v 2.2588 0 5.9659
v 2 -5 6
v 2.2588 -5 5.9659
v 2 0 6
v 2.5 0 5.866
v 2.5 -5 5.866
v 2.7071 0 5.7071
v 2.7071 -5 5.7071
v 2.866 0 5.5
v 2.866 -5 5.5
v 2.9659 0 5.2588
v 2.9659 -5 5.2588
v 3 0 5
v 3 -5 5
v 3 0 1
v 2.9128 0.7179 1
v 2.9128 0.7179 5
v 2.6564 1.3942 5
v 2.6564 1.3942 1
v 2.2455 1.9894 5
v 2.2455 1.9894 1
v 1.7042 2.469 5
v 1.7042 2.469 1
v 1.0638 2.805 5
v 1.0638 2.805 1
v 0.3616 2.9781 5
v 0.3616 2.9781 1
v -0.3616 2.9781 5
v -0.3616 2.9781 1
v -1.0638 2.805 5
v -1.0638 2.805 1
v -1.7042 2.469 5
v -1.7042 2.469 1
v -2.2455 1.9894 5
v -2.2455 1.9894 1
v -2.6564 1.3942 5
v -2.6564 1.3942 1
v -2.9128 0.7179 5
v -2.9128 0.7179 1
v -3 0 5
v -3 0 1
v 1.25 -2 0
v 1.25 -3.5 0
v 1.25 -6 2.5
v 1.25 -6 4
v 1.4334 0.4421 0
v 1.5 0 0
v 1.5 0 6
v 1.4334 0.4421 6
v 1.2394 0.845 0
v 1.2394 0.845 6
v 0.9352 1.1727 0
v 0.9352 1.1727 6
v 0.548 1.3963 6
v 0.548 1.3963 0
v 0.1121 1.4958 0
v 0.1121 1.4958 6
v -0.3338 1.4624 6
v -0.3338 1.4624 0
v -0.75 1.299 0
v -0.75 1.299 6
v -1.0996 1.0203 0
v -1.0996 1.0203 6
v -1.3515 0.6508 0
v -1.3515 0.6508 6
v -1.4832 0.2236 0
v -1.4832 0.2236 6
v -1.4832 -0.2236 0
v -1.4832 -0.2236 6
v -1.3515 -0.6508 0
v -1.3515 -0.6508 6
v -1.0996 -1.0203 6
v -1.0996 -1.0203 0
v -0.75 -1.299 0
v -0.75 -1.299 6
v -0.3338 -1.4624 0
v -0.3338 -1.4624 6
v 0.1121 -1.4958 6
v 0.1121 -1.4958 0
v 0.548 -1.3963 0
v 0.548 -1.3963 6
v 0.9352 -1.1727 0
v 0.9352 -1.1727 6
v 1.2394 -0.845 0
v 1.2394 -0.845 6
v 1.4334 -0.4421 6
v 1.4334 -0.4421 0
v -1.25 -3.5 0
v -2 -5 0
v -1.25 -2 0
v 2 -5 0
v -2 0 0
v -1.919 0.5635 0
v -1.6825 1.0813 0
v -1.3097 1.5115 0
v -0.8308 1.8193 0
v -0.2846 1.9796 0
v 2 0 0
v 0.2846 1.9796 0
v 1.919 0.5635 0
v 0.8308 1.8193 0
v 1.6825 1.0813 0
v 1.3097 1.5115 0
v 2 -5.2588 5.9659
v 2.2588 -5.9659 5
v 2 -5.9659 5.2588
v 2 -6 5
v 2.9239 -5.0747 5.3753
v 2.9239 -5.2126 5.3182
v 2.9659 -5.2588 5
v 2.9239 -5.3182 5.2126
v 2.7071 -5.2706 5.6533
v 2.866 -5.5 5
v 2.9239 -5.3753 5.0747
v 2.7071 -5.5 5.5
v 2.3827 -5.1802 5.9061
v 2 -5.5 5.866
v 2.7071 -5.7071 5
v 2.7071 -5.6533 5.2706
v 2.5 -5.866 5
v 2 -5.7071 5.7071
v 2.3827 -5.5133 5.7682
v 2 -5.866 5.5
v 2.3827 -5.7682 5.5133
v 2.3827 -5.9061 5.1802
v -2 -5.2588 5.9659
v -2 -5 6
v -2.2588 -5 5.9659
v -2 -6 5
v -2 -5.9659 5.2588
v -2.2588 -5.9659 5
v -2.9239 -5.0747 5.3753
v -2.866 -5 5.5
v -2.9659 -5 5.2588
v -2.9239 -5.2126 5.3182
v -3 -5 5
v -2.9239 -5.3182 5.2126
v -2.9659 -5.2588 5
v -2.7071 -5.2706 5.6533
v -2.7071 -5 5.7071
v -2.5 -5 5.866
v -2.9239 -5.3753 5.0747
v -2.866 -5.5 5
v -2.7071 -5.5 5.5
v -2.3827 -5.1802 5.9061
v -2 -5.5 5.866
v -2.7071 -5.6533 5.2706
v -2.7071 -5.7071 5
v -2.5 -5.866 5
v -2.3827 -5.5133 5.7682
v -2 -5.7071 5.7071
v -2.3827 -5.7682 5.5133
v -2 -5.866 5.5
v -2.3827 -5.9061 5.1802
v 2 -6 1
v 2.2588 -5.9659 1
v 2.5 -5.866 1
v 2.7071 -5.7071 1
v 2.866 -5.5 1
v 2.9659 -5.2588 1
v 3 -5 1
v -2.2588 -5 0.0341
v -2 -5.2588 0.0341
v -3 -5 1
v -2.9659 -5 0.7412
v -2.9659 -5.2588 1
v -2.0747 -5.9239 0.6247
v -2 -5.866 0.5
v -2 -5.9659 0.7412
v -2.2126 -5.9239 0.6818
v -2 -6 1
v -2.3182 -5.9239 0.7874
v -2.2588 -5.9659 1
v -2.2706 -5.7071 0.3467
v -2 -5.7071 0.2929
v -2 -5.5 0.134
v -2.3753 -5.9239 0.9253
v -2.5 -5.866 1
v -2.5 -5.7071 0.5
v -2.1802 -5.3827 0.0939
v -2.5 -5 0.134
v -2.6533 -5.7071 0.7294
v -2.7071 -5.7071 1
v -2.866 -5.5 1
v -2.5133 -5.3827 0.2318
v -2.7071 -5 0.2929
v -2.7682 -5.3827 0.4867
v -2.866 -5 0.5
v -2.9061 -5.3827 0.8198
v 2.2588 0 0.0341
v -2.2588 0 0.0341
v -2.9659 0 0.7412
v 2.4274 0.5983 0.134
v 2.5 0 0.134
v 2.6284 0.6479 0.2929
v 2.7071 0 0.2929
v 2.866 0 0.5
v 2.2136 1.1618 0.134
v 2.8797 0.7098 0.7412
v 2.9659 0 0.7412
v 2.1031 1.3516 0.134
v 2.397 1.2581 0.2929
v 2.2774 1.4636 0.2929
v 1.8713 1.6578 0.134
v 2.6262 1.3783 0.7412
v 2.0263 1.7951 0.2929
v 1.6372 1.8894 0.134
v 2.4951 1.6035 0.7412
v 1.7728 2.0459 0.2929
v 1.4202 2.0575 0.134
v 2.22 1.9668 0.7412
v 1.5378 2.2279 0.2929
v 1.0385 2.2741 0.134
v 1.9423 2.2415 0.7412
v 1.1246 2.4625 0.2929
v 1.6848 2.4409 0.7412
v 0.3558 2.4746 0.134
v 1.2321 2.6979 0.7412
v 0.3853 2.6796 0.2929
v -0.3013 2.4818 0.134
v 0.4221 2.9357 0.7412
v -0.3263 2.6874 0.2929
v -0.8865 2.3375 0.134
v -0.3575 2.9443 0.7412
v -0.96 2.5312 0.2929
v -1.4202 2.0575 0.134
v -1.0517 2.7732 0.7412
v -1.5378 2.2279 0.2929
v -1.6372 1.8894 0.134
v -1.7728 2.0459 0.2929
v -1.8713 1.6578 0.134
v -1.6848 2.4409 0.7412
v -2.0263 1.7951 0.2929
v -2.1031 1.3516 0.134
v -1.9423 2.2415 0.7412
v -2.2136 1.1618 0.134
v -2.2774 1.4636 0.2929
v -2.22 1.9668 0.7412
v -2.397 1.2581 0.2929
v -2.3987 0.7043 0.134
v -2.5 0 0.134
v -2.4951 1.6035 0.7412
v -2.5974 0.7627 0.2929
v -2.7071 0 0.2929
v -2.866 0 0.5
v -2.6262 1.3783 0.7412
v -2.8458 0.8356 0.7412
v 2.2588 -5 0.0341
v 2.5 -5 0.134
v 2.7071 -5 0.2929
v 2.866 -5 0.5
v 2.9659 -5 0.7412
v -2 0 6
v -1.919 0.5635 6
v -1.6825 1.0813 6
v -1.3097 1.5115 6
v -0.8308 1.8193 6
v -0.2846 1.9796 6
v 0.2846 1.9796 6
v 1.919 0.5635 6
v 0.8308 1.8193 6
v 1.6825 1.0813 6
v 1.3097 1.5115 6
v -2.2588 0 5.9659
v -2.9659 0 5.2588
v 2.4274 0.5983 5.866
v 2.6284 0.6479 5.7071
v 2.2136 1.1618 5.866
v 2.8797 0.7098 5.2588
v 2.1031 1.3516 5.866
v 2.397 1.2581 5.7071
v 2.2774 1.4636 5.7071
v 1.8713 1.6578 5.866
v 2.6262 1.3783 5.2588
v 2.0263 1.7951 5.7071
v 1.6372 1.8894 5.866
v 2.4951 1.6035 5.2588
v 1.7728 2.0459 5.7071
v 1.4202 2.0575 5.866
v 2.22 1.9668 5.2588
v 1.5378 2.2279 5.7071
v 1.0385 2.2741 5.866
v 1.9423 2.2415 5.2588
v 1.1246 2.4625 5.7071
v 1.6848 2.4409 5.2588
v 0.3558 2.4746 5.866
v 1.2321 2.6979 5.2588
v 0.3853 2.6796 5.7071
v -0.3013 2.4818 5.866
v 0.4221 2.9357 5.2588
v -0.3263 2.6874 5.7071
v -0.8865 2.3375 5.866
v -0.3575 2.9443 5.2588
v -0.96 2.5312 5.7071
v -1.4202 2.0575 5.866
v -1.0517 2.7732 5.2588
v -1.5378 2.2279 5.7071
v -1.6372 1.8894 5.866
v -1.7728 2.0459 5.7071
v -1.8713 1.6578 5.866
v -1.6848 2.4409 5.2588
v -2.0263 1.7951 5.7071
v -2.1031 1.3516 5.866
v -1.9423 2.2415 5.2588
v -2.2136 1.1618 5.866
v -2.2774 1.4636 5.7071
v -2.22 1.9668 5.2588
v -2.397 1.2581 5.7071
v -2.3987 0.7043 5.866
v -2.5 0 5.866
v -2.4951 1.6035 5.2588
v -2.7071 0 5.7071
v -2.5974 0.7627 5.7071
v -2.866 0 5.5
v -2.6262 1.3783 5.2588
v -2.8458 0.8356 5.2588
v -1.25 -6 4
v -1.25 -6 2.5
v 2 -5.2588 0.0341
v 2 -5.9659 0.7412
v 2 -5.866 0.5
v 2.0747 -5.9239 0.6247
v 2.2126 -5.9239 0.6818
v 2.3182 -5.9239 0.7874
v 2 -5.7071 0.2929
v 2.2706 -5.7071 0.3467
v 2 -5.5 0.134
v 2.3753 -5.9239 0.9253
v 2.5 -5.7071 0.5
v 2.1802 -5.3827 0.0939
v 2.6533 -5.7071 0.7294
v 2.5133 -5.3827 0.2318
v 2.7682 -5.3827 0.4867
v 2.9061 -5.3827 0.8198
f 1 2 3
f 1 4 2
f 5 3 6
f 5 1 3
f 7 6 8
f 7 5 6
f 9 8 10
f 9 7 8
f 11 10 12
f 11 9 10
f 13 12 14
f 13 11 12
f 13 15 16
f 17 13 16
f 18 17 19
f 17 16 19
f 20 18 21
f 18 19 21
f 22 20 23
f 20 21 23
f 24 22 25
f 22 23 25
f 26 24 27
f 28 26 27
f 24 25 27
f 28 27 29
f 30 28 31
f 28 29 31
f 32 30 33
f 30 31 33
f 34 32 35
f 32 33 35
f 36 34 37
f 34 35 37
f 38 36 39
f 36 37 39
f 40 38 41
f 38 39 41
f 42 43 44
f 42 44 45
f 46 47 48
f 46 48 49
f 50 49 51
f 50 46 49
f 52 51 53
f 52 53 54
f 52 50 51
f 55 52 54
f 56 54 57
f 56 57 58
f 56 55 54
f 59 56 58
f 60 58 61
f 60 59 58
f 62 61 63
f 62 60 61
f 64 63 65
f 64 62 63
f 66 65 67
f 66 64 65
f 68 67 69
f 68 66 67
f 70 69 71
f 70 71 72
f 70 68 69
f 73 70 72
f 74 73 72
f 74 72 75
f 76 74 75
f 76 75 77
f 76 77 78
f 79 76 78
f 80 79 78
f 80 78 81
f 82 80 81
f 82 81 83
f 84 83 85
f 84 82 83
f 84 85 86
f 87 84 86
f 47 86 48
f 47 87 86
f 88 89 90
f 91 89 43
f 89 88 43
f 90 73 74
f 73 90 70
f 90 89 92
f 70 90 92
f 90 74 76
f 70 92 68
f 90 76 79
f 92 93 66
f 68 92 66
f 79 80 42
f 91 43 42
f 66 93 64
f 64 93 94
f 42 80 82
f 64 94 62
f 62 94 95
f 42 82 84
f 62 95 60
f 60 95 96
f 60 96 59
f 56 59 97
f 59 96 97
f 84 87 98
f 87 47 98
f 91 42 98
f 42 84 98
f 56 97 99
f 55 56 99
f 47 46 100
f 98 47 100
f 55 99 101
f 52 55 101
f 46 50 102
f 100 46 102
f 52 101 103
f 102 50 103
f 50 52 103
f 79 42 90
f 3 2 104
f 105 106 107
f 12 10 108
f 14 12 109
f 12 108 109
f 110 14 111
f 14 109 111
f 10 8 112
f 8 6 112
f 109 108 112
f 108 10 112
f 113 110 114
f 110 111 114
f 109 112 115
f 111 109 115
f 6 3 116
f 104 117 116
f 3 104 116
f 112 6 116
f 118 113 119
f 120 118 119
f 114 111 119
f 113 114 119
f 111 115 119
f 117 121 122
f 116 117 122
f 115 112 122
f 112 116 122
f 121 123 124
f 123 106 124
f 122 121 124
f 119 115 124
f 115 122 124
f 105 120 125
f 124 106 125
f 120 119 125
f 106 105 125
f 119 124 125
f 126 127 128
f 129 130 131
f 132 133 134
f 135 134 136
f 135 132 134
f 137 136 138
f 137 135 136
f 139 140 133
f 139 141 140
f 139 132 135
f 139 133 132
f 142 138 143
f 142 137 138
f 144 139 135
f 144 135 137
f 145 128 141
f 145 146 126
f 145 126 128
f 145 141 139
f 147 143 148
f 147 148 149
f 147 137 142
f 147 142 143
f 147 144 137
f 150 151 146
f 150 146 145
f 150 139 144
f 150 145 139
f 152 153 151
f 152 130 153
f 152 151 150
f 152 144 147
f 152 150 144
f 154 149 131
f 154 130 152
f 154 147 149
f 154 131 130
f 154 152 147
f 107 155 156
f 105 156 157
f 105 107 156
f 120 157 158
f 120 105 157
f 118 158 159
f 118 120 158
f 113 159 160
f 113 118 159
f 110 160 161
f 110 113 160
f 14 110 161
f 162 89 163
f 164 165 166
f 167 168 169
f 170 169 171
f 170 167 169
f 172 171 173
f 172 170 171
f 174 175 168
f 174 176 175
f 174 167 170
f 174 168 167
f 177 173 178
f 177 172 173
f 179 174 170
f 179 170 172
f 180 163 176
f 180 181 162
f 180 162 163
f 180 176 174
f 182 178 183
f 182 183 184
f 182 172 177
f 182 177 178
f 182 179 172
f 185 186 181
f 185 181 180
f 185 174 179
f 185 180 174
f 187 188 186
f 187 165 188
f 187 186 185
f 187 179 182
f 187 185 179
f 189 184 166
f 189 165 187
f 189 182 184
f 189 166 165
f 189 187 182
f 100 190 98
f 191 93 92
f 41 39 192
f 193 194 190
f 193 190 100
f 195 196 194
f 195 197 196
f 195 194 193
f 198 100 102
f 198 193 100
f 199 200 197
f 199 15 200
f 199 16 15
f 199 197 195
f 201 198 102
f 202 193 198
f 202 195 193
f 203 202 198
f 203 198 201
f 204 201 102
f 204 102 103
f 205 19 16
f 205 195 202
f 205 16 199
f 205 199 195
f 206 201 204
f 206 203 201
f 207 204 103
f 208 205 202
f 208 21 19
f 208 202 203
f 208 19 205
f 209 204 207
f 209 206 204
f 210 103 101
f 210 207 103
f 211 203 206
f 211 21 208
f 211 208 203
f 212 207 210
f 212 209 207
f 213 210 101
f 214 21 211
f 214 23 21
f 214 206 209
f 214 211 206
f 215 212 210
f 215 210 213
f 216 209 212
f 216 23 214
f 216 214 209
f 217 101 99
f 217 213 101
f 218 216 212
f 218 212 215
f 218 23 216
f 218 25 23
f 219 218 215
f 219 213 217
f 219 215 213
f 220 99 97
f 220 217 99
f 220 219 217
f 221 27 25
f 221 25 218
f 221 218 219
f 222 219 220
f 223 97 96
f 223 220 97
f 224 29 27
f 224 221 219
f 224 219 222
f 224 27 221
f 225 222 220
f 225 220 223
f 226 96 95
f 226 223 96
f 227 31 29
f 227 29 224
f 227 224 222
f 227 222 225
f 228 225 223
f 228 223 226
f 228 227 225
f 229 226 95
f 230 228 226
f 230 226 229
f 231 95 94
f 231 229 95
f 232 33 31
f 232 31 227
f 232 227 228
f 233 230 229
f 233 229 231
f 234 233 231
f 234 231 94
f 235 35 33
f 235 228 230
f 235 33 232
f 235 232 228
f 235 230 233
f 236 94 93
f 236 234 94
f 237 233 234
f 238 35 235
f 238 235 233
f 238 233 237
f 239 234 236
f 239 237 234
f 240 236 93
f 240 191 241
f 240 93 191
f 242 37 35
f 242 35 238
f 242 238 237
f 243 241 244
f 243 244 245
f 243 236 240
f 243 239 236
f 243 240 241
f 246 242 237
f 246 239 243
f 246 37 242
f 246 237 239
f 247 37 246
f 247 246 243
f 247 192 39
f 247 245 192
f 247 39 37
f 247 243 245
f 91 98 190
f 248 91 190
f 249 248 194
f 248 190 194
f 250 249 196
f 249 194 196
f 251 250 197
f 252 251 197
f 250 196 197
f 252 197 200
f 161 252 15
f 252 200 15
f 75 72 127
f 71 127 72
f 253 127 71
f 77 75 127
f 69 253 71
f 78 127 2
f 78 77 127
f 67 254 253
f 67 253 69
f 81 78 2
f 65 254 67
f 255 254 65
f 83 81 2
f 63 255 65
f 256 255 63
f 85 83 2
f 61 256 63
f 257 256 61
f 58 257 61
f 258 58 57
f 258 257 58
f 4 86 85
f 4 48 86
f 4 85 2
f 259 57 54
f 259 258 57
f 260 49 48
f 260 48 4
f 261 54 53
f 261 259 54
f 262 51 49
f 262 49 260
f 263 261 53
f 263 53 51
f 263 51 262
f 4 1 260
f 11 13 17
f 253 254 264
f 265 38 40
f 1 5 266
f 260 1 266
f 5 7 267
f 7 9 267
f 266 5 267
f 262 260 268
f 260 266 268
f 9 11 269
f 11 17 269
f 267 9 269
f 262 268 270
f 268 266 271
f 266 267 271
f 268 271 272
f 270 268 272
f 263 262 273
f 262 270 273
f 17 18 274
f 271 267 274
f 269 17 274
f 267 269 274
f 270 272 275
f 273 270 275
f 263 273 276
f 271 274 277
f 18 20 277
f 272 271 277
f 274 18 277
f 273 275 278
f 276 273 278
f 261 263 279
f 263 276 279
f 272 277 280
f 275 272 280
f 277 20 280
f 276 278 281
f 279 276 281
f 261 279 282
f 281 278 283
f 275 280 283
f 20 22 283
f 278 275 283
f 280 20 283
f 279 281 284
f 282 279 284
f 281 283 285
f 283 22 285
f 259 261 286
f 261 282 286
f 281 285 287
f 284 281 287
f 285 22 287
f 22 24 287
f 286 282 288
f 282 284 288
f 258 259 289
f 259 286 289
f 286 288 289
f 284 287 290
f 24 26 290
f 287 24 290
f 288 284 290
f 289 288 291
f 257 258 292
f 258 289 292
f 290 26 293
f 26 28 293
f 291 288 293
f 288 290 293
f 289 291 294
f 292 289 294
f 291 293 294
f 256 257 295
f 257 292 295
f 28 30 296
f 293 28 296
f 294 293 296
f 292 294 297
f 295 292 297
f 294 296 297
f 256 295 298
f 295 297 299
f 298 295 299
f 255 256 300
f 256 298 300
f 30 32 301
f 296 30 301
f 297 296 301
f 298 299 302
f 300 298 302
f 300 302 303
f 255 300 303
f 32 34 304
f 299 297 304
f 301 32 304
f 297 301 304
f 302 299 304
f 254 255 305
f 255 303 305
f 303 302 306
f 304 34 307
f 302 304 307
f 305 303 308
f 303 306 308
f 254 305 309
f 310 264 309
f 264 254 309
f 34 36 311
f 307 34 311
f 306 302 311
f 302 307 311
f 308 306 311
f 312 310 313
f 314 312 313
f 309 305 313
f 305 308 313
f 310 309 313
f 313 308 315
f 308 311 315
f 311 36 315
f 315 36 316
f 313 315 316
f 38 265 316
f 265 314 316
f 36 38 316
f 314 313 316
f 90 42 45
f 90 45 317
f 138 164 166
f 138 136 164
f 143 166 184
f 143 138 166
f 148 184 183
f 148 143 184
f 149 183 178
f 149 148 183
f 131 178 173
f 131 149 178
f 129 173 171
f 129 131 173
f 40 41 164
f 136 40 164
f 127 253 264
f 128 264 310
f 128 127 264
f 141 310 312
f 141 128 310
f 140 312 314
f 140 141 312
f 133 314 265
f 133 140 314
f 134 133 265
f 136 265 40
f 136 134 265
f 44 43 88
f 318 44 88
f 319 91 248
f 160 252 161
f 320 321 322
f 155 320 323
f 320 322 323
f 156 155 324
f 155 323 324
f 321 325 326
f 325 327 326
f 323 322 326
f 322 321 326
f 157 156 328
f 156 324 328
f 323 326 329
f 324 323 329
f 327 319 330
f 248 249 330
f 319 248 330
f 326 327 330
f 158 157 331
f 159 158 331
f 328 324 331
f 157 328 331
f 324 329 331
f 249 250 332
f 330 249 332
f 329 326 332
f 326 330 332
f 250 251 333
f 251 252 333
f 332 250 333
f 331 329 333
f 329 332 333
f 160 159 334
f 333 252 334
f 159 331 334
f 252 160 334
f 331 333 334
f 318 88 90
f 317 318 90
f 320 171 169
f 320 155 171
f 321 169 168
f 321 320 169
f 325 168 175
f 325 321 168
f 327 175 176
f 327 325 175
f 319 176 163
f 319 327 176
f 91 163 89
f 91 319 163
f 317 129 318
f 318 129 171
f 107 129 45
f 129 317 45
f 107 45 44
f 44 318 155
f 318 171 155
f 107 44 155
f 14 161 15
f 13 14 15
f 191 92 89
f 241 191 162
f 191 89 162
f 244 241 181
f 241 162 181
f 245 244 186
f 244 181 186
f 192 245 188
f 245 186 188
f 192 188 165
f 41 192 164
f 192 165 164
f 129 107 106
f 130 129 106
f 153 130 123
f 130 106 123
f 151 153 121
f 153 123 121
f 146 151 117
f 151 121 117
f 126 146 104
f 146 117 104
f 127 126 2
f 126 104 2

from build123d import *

# Parameters (mm, degrees)
CROQUIS1_R              = 1.5
SALIENTE_EXTRUIR1_DEPTH = 6
CROQUIS2_W              = 2.5
CROQUIS2_H              = 1.5
CORTAR_EXTRUIR1_DEPTH   = 6
REDONDEO3_R             = 1


with BuildPart() as part:
    # Croquis1 → Saliente-Extruir1 (new body)
    with BuildSketch(Plane.XY):
        with BuildLine():
            Line((-3, 0), (-3, -6))
            Line((-3, -6), (3, -6))
            Line((3, -6), (3, 0))
            ThreePointArc((3, 0), (0, 3), (-3, 0))
        make_face()
        Circle(CROQUIS1_R, mode=Mode.SUBTRACT)
    extrude(amount=SALIENTE_EXTRUIR1_DEPTH)

    # Croquis2 → Cortar-Extruir1 (cut, along a direction that is not the sketch's normal)
    with BuildSketch(Plane(origin=(0, 0, 0), x_dir=(-1, 0, 0), z_dir=(0, 0, -1))):
        with Locations((0, -2.75)):
            Rectangle(CROQUIS2_W, CROQUIS2_H)
    extrude(amount=-CORTAR_EXTRUIR1_DEPTH, dir=(0, 0.7071067811865436, -0.7071067811865515), mode=Mode.SUBTRACT)

    # Redondeo3
    redondeo3_edges = [part.edges().sort_by_distance(p)[0] for p in [
        (0, -6, 6),
        (3, -3, 6),
        (0, 3, 6),
        (3, -3, 0),
        (0, -6, 0),
        (-3, -3, 0),
        (0, 3, 0),
        (-3, -3, 6),
        (3, -6, 3),
        (-3, -6, 3),
    ]]
    fillet(redondeo3_edges, radius=REDONDEO3_R)


solid = part.part
